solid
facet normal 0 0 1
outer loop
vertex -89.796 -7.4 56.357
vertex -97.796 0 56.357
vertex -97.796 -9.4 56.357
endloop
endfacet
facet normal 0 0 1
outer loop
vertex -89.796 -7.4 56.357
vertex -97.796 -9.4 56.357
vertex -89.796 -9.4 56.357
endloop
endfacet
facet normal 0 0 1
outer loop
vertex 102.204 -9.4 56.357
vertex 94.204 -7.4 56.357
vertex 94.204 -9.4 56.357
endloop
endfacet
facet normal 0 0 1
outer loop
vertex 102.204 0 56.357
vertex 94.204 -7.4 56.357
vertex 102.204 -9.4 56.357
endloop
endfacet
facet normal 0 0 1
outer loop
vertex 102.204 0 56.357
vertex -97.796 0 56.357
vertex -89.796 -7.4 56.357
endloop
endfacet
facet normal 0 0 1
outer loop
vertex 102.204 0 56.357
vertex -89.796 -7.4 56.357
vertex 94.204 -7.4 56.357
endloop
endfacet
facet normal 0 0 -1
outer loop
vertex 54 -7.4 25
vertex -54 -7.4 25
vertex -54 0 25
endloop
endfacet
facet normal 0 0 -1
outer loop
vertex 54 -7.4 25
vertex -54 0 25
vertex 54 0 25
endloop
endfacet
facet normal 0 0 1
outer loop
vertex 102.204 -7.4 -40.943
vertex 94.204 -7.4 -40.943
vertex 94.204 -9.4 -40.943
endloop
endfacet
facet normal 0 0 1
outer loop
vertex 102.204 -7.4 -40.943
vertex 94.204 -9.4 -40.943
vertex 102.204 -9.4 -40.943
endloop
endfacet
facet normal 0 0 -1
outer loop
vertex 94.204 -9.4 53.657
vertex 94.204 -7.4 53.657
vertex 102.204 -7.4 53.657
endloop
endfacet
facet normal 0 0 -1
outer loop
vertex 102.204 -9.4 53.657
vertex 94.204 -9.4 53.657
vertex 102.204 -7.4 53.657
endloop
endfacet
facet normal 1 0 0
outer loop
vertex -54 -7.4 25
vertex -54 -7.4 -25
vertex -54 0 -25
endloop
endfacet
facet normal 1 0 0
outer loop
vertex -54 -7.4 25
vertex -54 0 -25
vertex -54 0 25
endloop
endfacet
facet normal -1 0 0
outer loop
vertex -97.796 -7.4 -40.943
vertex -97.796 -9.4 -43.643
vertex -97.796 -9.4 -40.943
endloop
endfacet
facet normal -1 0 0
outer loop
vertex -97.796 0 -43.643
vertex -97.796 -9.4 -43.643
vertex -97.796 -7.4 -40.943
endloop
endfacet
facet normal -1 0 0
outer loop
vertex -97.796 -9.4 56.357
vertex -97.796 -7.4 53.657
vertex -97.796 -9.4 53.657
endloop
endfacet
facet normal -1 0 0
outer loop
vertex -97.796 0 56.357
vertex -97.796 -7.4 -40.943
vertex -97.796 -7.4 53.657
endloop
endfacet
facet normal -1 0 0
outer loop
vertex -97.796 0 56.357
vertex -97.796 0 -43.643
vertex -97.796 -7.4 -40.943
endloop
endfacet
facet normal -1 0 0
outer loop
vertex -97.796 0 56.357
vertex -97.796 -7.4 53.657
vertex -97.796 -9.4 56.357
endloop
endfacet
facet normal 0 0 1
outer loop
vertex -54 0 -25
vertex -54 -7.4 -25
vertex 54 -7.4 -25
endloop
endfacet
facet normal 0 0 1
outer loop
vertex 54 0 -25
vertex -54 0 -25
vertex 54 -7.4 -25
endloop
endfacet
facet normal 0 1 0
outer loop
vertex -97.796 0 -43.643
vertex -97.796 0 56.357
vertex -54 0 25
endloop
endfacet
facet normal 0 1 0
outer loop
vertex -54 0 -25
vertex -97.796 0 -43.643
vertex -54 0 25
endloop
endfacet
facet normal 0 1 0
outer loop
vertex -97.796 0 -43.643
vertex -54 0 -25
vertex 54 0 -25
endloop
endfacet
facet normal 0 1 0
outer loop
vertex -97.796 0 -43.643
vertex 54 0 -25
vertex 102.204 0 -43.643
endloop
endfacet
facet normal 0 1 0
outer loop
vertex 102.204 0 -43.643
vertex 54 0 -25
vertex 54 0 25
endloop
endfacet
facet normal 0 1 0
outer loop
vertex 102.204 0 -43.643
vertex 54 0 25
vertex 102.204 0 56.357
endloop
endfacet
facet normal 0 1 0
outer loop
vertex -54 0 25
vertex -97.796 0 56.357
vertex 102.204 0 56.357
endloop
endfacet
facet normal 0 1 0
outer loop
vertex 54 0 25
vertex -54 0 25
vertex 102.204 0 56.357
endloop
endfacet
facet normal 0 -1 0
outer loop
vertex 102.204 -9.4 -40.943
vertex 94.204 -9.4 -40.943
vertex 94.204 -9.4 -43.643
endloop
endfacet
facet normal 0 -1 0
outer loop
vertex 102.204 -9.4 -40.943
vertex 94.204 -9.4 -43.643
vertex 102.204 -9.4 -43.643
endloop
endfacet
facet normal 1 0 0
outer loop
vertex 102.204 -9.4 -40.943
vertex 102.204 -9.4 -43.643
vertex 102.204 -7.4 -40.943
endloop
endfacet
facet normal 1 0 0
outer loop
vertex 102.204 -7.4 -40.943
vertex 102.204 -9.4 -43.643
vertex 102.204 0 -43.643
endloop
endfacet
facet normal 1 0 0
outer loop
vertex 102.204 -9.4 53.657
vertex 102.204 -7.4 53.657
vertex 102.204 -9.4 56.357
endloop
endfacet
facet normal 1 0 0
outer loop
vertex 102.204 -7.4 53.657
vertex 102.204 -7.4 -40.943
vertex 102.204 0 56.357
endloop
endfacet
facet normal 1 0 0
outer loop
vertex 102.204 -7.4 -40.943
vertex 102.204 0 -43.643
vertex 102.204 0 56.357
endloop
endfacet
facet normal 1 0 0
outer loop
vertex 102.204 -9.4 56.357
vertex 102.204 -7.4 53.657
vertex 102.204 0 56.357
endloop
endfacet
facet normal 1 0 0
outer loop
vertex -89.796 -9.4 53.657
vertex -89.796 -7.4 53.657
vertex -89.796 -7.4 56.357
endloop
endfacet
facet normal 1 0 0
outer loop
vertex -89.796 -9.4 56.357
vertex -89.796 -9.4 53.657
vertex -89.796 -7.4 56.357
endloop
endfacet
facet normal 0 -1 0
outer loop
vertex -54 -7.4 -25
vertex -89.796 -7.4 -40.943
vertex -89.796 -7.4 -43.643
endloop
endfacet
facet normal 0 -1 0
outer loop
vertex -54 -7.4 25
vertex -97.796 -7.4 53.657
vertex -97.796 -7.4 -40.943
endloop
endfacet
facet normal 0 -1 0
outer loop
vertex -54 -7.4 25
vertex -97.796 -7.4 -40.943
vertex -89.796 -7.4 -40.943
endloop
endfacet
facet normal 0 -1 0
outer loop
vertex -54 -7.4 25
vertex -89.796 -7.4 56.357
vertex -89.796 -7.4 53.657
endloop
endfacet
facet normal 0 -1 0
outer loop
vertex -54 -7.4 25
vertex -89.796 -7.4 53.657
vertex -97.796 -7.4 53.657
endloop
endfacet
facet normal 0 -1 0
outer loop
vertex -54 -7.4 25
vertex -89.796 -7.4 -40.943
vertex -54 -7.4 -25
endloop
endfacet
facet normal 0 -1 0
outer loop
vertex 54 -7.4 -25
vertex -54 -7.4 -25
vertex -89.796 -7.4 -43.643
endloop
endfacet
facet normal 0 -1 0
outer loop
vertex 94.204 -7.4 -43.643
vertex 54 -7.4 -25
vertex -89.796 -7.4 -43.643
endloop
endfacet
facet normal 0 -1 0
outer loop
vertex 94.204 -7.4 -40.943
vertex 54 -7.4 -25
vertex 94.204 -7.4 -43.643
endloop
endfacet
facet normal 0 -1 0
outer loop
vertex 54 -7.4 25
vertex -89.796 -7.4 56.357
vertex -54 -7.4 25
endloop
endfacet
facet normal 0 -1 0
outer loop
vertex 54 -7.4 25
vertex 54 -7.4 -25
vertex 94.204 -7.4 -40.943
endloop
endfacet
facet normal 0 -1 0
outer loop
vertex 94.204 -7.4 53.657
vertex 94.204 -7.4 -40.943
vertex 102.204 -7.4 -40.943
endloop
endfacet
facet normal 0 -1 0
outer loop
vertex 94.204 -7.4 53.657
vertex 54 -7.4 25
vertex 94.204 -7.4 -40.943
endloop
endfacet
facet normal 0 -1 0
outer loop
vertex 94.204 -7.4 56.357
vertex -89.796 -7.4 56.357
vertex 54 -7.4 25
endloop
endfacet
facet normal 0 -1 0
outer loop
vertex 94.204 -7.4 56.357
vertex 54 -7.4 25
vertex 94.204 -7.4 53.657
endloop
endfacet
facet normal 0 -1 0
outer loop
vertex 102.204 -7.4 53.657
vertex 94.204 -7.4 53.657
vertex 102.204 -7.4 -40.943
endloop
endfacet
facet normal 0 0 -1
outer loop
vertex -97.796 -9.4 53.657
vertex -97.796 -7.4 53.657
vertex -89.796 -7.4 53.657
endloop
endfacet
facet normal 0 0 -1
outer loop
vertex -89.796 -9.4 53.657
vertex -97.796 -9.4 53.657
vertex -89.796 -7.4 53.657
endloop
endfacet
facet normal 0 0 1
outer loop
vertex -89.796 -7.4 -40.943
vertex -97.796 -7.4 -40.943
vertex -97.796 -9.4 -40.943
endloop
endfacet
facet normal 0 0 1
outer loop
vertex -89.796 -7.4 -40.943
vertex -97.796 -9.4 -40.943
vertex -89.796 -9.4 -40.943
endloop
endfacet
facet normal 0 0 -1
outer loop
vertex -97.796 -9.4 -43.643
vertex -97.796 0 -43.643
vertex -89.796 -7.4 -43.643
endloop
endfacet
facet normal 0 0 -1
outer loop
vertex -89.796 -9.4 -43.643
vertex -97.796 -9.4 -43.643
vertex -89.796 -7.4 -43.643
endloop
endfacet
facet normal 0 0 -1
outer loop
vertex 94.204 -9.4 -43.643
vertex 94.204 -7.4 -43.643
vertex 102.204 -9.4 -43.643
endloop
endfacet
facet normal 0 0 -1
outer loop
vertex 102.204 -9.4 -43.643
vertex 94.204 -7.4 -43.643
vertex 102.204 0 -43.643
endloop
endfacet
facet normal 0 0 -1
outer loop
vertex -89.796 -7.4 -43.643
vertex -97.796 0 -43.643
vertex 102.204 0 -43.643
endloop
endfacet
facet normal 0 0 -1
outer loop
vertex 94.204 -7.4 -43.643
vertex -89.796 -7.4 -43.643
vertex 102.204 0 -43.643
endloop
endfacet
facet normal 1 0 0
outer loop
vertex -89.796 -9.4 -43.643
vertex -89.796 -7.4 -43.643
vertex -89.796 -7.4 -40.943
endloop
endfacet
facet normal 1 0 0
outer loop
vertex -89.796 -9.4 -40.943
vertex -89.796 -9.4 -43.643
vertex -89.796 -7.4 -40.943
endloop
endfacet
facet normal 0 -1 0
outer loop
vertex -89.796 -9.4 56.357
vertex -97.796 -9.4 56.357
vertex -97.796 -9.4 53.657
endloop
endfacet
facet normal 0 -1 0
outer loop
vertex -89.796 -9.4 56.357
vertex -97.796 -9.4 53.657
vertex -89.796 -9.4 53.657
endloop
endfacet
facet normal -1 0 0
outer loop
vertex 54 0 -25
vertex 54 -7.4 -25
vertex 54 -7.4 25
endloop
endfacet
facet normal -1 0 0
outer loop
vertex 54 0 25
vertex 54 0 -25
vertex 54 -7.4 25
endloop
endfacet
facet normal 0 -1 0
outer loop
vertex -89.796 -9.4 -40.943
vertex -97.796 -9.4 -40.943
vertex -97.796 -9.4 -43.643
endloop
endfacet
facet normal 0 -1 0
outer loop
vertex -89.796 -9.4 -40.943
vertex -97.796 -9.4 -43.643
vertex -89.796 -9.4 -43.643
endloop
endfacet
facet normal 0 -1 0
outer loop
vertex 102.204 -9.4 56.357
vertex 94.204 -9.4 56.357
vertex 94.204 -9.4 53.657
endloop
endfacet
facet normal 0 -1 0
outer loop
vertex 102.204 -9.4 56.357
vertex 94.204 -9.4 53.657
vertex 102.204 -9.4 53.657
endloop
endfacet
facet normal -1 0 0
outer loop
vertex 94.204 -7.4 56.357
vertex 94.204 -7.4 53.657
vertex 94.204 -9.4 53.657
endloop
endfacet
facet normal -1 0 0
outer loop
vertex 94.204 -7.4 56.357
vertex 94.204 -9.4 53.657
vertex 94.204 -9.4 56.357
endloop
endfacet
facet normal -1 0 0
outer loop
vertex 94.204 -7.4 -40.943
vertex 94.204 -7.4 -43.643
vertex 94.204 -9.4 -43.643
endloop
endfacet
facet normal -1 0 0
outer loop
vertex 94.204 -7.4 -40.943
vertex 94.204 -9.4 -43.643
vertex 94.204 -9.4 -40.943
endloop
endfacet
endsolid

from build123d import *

# Parameters (mm, degrees)
F0_W     = 200
F0_H     = 100
F1_DEPTH = 7.4
F2_W     = 8
F2_H     = 2.7
F3_DEPTH = 2
F4_W     = 108
F4_H     = 50
F5_DEPTH = 7.401


with BuildPart() as f1:
    # F0 (on Front) → F1 (new body)
    with BuildSketch(Plane.XZ):
        with Locations((2.203826, 6.35675)):
            Rectangle(F0_W, F0_H)
    extrude(amount=F1_DEPTH)

    # F2 (on face) → F3 (join)
    with BuildSketch(Plane.XZ.offset(7.4)):
        with Locations((-93.796174, 55.00675)):
            Rectangle(F2_W, F2_H)
        with Locations((98.203826, 55.00675)):
            Rectangle(F2_W, F2_H)
        with Locations((98.203826, -42.29325)):
            Rectangle(F2_W, F2_H)
        with Locations((-93.796174, -42.29325)):
            Rectangle(F2_W, F2_H)
    extrude(amount=F3_DEPTH)

    # F4 (on face) → F5 (cut, through all)
    with BuildSketch(Plane.XZ.offset(7.4)):
        Rectangle(F4_W, F4_H)
    extrude(amount=-F5_DEPTH, mode=Mode.SUBTRACT)


solid = f1.part
